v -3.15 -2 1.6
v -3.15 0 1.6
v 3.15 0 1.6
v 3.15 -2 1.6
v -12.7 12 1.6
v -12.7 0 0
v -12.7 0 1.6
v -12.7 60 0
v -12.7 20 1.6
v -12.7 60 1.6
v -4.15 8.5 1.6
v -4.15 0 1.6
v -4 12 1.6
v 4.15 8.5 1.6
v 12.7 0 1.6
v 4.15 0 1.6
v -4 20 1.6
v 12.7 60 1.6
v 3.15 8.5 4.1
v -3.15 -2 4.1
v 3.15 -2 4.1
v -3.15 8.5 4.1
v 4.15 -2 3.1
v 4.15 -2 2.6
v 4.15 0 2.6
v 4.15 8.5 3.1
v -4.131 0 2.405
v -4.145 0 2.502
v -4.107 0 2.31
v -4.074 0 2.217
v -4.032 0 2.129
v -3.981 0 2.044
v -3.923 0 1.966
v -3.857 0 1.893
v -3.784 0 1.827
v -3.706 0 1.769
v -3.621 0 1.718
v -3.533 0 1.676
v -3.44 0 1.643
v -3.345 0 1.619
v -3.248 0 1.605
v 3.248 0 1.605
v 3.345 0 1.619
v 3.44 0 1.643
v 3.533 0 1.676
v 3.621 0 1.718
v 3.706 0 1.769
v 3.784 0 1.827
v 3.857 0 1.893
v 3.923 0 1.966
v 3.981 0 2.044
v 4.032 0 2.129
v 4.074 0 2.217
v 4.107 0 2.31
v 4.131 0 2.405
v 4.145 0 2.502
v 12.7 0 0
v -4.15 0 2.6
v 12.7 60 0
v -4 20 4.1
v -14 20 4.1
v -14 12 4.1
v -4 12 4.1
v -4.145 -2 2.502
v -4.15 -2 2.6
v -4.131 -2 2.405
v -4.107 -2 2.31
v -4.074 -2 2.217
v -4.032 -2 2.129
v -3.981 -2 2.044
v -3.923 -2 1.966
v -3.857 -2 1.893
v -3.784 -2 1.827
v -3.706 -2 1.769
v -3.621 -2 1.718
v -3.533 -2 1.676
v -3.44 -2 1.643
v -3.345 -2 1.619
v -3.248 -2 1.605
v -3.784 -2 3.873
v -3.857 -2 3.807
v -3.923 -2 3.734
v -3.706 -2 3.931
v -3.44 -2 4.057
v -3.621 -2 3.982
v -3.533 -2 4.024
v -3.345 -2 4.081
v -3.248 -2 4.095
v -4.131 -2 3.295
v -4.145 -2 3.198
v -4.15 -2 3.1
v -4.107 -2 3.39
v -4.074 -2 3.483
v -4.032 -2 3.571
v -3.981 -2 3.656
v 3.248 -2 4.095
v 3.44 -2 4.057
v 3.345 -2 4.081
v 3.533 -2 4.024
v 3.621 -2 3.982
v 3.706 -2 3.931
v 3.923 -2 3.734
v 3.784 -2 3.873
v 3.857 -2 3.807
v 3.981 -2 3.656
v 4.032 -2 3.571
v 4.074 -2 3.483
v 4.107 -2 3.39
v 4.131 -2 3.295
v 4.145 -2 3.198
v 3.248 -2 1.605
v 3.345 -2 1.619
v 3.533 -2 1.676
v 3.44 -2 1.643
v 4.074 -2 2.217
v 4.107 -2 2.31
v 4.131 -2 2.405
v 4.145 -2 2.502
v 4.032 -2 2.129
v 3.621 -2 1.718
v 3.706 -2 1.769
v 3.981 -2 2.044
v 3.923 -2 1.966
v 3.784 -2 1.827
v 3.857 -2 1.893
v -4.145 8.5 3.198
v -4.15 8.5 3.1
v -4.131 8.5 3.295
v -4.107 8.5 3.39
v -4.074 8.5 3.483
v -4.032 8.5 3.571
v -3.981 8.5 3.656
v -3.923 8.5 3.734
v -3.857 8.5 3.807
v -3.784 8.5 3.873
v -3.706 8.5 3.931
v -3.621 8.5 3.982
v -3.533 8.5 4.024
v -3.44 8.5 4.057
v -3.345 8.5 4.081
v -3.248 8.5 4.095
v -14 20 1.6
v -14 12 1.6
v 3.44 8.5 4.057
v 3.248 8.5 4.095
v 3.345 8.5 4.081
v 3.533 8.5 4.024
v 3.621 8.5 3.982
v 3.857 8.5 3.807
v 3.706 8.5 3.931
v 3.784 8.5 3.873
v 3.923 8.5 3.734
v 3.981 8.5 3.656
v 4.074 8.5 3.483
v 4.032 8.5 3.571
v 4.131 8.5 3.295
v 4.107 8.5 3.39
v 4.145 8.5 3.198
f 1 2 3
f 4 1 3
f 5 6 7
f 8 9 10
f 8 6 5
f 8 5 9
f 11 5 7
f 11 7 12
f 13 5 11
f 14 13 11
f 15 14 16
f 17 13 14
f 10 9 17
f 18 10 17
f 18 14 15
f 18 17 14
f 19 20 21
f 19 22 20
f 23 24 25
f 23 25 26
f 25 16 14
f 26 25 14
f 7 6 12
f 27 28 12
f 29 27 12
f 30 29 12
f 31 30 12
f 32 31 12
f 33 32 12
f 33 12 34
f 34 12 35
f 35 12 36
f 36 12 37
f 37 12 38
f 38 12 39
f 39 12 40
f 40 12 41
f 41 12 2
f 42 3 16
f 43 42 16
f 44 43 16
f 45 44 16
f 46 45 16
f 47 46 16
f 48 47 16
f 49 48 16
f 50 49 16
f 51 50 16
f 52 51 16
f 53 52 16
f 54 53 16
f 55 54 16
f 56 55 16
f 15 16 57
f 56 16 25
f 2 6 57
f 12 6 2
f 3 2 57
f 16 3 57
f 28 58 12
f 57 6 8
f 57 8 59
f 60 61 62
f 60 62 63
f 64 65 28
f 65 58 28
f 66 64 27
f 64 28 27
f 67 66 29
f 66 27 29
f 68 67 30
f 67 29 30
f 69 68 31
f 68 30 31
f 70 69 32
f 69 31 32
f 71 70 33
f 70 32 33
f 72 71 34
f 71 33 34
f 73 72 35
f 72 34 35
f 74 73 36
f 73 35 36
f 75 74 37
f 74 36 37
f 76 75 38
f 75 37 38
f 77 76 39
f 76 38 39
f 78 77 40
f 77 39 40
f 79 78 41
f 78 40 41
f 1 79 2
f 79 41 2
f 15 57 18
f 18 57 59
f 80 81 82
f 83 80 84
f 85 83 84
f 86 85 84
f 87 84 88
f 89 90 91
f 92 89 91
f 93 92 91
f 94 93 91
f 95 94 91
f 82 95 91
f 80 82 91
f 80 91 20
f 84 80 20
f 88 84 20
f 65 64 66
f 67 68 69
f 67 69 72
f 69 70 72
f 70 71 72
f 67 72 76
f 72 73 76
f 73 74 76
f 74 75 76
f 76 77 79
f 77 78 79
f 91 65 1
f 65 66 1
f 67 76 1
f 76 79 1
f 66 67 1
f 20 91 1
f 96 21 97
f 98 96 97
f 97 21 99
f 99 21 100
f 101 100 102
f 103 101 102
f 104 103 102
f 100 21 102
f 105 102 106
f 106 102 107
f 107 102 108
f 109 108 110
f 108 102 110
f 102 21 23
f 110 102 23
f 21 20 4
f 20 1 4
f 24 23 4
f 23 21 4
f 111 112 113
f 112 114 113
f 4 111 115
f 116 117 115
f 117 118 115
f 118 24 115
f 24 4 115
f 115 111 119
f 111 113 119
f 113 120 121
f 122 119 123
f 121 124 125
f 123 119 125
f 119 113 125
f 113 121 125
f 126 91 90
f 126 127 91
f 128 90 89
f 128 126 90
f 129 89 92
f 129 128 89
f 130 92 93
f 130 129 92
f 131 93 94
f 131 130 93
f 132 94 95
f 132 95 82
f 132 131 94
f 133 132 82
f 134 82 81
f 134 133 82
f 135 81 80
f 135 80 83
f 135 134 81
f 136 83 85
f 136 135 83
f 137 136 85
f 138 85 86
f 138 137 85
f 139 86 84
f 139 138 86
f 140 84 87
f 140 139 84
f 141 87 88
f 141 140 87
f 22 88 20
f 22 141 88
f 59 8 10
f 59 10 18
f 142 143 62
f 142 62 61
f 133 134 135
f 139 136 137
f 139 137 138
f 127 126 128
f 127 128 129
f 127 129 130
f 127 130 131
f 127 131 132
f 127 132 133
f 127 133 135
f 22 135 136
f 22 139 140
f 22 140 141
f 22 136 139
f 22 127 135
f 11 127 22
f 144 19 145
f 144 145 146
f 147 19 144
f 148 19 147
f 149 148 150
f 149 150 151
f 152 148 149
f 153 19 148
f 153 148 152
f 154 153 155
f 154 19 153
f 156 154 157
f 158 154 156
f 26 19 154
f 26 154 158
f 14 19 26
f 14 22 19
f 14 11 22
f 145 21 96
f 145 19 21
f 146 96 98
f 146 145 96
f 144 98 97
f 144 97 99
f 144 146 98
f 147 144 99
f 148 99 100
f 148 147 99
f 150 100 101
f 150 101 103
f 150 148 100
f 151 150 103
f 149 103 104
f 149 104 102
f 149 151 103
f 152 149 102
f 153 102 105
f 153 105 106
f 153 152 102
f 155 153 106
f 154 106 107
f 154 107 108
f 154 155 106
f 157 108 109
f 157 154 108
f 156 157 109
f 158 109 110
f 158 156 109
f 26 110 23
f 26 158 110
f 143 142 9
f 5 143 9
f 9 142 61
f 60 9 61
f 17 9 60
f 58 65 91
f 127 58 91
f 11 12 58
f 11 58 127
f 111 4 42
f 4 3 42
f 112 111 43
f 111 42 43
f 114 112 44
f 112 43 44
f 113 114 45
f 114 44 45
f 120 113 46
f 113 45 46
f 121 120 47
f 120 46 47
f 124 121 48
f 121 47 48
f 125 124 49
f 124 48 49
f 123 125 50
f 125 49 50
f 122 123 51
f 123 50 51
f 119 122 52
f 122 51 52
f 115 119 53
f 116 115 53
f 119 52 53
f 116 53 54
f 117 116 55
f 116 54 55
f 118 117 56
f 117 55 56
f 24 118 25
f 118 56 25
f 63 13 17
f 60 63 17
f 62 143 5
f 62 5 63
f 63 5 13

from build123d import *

# Parameters (mm, degrees)
SKETCH_W     = 25.4
SKETCH_H     = 60
PAD_DEPTH    = 1.6
SKETCH001_W  = 8.3
SKETCH001_H  = 10.5
PAD001_DEPTH = 2.5
FILLET_R     = 1
SKETCH002_W  = 10
SKETCH002_H  = 8
PAD002_DEPTH = 2.5


with BuildPart() as part:
    # Sketch → Pad (new body)
    with BuildSketch(Plane.XY):
        with Locations((0, 30)):
            Rectangle(SKETCH_W, SKETCH_H)
    extrude(amount=PAD_DEPTH)

    # Sketch001 (on DatumPlane) → Pad001 (join)
    with BuildSketch(Plane.XY.offset(1.6)):
        with Locations((0, 3.25)):
            Rectangle(SKETCH001_W, SKETCH001_H)
    extrude(amount=PAD001_DEPTH)

    # Fillet
    fillet_edges = [part.edges().sort_by_distance(p)[0] for p in [
        (4.15, 3.25, 4.1),
        (-4.15, 3.25, 4.1),
        (-4.15, -1, 1.6),
        (4.15, -1, 1.6),
    ]]
    fillet(fillet_edges, radius=FILLET_R)

    # Sketch002 (on DatumPlane) → Pad002 (join)
    with BuildSketch(Plane.XY.offset(1.6)):
        with Locations((-9, 16)):
            Rectangle(SKETCH002_W, SKETCH002_H)
    extrude(amount=PAD002_DEPTH)


solid = part.part
